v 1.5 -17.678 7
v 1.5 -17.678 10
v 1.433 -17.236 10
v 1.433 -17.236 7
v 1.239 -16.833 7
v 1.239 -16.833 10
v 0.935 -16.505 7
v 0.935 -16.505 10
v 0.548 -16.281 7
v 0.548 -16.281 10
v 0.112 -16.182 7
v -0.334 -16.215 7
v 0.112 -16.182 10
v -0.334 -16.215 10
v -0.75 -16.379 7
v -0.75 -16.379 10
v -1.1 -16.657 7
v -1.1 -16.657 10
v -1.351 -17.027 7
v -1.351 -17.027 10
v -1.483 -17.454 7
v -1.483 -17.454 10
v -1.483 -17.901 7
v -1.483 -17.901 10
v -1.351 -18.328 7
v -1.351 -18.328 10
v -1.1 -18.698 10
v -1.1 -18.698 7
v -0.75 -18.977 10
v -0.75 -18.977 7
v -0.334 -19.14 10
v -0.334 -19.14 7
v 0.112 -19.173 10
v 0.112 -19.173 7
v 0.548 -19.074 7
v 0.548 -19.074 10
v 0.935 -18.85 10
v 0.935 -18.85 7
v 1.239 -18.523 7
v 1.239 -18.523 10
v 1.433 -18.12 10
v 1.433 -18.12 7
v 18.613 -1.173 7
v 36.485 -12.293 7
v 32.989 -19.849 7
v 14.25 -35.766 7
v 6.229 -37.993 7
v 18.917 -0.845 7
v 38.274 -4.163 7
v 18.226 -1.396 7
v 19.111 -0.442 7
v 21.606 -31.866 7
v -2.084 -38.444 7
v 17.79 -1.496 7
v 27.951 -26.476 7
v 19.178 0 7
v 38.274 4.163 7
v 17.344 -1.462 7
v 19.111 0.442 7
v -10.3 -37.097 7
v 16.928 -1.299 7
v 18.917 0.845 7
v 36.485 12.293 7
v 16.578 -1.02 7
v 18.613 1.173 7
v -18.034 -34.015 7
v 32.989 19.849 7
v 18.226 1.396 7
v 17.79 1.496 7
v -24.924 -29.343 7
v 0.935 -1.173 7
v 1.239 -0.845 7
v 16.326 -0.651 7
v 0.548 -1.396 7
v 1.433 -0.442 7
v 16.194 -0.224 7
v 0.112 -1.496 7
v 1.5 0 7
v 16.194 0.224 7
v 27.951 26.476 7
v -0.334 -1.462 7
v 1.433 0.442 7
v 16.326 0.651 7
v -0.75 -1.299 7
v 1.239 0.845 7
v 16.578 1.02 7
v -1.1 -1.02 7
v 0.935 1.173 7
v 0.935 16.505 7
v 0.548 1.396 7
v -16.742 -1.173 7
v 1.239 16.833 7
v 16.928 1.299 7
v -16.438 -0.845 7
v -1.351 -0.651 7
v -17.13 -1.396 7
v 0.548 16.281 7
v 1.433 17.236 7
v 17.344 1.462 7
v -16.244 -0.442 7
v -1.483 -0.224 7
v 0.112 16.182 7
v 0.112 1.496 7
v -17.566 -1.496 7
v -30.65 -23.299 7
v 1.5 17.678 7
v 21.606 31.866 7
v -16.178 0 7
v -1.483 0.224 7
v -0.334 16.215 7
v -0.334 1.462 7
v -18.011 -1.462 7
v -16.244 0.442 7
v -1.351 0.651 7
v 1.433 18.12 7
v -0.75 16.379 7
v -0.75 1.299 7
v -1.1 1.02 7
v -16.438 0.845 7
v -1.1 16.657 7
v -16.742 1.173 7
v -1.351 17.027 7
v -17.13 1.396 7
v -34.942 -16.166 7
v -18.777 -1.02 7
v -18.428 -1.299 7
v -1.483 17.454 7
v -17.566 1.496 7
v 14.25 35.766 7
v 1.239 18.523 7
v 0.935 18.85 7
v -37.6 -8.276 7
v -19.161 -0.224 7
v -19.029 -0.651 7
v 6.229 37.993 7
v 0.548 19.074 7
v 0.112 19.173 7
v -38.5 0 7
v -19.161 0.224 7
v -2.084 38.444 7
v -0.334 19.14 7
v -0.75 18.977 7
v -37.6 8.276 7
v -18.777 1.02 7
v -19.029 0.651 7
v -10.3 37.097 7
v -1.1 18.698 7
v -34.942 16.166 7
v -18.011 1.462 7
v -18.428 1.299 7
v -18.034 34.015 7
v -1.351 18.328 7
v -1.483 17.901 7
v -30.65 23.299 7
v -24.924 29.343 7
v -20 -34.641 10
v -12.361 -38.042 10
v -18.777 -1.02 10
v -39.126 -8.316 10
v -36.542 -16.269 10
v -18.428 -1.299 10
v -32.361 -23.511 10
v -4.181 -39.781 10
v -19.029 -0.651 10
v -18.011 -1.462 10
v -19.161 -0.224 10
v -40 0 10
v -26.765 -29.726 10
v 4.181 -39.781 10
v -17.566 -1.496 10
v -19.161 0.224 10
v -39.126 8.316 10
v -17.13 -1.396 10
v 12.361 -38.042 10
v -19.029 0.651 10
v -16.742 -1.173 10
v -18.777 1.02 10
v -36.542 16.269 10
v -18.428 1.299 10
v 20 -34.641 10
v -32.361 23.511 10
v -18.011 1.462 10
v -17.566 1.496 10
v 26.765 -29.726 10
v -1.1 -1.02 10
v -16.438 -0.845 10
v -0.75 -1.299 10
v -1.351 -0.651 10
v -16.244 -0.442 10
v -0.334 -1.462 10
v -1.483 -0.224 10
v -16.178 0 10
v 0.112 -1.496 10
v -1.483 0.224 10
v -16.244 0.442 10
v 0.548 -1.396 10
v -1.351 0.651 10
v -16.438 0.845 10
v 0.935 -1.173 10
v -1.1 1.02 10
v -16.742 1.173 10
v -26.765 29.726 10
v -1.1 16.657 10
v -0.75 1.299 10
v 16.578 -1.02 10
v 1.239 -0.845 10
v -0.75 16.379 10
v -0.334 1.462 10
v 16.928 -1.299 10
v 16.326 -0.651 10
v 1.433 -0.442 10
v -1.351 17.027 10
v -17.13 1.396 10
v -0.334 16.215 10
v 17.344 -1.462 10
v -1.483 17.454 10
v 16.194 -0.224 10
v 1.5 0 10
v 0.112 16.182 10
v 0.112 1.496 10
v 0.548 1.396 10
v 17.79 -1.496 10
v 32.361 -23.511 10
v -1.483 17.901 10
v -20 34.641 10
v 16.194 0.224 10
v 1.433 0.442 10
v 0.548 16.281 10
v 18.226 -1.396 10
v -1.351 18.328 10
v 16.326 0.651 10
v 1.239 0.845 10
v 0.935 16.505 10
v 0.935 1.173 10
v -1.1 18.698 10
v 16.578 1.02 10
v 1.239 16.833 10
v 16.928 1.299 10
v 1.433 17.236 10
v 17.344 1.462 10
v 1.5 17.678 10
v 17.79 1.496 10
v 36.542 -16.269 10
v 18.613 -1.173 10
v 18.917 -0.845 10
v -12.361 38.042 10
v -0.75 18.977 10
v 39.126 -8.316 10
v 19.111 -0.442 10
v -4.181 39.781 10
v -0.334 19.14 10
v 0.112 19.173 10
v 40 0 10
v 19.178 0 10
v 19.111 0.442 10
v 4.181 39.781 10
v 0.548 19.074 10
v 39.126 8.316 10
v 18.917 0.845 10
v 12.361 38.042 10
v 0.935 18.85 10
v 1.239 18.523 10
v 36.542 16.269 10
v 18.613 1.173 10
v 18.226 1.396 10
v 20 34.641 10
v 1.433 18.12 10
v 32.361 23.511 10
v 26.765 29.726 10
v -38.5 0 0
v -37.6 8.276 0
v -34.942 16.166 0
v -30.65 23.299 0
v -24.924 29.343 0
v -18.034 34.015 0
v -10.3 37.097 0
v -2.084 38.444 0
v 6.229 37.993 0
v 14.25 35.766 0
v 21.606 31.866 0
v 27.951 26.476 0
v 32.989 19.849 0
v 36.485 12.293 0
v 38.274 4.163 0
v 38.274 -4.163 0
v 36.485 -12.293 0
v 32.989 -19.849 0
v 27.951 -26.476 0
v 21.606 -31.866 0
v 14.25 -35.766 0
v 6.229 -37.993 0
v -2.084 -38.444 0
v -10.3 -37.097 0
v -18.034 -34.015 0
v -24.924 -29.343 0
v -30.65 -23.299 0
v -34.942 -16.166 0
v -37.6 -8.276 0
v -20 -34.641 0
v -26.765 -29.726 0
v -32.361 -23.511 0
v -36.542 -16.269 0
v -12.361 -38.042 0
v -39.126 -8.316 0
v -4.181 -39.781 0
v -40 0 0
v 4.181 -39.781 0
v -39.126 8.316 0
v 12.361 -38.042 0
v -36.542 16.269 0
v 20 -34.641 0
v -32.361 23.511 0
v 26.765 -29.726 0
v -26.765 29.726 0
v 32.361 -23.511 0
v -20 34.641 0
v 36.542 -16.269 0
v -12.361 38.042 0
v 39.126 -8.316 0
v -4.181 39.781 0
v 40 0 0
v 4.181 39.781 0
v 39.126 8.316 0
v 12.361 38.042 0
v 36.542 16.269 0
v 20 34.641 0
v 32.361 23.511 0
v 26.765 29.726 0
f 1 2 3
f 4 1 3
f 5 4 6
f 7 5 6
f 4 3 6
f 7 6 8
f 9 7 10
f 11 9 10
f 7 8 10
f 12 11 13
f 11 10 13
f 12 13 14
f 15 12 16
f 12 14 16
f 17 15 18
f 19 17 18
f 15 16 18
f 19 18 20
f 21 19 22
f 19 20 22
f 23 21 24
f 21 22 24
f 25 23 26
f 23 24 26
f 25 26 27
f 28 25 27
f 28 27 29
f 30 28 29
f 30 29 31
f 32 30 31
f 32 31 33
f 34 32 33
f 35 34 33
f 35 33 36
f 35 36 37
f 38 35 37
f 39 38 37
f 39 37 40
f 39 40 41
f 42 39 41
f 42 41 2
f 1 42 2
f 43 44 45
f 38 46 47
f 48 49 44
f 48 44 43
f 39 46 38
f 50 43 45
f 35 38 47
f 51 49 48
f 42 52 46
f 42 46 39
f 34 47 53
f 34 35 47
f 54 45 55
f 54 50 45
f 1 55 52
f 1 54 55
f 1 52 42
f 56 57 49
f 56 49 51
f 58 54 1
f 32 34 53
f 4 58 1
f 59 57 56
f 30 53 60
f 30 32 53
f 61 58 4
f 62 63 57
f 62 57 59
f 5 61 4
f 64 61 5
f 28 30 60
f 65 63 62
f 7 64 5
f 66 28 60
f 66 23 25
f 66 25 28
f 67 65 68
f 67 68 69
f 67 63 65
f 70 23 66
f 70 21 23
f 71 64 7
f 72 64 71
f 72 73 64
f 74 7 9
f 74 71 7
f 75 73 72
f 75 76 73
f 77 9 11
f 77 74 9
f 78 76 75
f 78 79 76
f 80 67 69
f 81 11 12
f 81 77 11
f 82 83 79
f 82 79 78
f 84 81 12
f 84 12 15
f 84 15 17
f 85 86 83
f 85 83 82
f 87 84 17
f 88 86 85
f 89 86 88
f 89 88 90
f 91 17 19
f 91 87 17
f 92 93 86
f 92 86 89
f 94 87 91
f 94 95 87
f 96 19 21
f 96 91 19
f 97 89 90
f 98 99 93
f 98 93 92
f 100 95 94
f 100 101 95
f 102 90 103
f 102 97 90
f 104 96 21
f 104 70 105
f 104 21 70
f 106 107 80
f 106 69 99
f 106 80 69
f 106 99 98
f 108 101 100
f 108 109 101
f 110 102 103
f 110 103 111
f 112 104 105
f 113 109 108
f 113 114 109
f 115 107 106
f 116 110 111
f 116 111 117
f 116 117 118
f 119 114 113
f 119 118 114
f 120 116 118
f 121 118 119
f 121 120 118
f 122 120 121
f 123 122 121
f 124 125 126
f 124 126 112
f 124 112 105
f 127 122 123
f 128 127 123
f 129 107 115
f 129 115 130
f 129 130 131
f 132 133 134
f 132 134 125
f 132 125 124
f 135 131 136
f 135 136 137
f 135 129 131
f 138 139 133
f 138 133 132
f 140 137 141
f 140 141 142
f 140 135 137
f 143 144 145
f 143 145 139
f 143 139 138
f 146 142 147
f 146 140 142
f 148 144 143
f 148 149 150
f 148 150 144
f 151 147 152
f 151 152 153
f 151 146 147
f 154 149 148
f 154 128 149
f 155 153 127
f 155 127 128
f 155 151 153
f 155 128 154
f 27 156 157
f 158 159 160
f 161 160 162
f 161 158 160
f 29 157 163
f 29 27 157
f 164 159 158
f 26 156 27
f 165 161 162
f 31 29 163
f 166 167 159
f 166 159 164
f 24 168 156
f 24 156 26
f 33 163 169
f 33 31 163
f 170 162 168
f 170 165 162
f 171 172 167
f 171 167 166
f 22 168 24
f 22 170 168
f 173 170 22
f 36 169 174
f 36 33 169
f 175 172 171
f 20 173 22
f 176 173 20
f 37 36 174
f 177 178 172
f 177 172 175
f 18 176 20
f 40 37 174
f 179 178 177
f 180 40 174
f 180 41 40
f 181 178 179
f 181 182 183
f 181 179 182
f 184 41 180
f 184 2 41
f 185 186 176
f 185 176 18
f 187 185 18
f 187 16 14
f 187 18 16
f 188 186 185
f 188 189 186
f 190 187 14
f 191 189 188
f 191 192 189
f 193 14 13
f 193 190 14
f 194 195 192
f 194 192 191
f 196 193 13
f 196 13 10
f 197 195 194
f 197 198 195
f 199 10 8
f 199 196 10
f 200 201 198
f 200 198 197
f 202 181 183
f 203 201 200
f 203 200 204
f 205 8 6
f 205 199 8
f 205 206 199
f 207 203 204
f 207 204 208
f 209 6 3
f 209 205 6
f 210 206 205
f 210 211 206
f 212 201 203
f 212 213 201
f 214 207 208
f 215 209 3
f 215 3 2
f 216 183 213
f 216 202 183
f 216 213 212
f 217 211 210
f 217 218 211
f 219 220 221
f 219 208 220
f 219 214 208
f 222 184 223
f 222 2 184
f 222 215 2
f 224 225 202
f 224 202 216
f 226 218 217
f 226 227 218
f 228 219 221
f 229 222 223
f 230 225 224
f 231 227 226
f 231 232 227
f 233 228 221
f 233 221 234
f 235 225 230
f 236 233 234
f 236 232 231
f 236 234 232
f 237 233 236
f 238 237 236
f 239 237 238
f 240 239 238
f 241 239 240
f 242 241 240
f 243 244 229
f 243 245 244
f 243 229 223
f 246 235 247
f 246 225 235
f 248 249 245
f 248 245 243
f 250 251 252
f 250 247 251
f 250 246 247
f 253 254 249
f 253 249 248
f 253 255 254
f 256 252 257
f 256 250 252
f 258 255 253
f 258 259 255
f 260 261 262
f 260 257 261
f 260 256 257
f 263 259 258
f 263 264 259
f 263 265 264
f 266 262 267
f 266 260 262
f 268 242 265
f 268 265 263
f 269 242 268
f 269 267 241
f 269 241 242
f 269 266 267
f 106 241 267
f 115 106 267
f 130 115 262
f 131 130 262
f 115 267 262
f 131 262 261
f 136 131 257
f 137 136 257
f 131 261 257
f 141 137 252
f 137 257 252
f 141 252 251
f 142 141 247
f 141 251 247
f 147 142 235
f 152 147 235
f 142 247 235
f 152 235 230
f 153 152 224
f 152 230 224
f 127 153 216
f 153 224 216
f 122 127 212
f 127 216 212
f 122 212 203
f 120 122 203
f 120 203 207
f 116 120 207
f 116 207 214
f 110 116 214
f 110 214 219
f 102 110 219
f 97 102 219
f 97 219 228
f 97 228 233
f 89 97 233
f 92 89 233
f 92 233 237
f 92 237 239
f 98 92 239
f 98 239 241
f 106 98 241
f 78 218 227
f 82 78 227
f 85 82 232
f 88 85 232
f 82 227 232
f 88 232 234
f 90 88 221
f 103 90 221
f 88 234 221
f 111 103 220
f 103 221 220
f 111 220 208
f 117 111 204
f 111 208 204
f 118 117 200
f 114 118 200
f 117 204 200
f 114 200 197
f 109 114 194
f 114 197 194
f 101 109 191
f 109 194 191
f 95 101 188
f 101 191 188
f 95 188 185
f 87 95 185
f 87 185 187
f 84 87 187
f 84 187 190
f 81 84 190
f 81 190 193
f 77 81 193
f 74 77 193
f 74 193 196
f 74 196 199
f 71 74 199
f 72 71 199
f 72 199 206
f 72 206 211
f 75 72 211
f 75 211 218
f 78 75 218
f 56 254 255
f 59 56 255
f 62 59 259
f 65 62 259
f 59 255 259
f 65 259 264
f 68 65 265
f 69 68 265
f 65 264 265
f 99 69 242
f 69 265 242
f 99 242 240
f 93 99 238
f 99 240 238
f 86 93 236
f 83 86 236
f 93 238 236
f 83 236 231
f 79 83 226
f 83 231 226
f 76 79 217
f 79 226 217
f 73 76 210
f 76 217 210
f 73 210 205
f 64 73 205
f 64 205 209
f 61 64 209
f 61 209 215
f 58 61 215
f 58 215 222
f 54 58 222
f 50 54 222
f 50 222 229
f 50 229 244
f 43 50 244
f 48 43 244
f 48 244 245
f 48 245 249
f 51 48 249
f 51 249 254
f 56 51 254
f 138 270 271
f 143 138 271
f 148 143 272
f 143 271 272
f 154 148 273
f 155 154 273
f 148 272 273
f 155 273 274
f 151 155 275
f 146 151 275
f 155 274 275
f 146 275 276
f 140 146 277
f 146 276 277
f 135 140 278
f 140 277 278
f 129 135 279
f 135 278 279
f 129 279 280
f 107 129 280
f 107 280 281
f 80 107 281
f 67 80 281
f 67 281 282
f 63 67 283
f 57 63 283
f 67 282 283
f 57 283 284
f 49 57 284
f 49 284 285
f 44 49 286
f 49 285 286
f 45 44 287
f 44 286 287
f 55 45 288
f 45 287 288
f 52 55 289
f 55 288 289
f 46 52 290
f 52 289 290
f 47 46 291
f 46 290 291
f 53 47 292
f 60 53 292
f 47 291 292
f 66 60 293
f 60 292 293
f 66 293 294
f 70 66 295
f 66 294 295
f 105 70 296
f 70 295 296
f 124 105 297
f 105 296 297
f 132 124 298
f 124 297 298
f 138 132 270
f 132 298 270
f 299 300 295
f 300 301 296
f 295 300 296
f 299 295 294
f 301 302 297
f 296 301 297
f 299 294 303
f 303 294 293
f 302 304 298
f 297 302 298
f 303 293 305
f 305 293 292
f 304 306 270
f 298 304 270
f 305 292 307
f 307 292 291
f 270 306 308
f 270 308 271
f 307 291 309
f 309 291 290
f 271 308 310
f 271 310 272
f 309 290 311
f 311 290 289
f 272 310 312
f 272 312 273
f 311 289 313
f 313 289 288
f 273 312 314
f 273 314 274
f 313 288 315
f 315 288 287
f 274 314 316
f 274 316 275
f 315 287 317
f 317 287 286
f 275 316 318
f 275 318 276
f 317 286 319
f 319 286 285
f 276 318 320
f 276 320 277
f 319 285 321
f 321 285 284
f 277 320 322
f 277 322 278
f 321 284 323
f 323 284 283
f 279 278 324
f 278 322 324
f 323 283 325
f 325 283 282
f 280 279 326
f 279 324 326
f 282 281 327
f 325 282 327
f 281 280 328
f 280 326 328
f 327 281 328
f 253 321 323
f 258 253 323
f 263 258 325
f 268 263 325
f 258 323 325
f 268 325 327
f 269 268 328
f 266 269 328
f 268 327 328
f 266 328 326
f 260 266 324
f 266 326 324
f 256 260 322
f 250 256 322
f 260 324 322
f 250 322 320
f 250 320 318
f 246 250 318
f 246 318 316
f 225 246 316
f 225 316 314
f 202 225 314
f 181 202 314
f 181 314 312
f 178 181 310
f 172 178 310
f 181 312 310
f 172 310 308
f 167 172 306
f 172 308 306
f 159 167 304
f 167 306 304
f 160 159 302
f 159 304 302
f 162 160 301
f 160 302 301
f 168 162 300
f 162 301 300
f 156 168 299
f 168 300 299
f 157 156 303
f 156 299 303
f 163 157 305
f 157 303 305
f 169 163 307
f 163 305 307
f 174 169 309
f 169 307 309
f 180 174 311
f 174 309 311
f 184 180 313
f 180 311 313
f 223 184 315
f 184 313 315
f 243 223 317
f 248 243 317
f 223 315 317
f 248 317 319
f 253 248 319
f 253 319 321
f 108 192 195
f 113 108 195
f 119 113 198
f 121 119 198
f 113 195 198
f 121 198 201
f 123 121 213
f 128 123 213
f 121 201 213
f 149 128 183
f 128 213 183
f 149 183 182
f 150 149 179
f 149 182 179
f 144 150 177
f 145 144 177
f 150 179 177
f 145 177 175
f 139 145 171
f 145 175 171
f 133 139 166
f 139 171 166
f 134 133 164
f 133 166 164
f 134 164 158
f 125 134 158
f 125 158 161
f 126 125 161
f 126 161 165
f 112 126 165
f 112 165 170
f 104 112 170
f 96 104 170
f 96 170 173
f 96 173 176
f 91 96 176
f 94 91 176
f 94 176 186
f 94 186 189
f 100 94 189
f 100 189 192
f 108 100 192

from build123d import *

# Parameters (mm, degrees)
SKETCH_1_R          = 40
EXTRUDE_1_DEPTH     = 10
SKETCH_2_R          = 38.5
CUT_EXTRUDE_1_DEPTH = 7
SKETCH_4_R          = 1.5
CUT_EXTRUDE_2_DEPTH = 58.445626465


with BuildPart() as part:
    # 草图1 → 凸台-拉伸1 (new body)
    with BuildSketch(Plane.XY):
        Circle(SKETCH_1_R)
    extrude(amount=EXTRUDE_1_DEPTH)

    # 草图2 → 切除-拉伸1 (cut)
    with BuildSketch(Plane(origin=(0, 0, 0), x_dir=(-1, 0, 0), z_dir=(0, 0, -1))):
        Circle(SKETCH_2_R)
    extrude(amount=-CUT_EXTRUDE_1_DEPTH, mode=Mode.SUBTRACT)

    # 草图4 → 切除-拉伸2 (cut, through all)
    with BuildSketch(Plane.XY.offset(10)):
        with Locations((0, 17.67766953)):
            Circle(SKETCH_4_R)
        with Locations((17.67766953, 0)):
            Circle(SKETCH_4_R)
        with Locations((0, -17.67766953)):
            Circle(SKETCH_4_R)
        with Locations((-17.67766953, 0)):
            Circle(SKETCH_4_R)
        Circle(SKETCH_4_R)
    extrude(amount=-CUT_EXTRUDE_2_DEPTH, mode=Mode.SUBTRACT)


solid = part.part
